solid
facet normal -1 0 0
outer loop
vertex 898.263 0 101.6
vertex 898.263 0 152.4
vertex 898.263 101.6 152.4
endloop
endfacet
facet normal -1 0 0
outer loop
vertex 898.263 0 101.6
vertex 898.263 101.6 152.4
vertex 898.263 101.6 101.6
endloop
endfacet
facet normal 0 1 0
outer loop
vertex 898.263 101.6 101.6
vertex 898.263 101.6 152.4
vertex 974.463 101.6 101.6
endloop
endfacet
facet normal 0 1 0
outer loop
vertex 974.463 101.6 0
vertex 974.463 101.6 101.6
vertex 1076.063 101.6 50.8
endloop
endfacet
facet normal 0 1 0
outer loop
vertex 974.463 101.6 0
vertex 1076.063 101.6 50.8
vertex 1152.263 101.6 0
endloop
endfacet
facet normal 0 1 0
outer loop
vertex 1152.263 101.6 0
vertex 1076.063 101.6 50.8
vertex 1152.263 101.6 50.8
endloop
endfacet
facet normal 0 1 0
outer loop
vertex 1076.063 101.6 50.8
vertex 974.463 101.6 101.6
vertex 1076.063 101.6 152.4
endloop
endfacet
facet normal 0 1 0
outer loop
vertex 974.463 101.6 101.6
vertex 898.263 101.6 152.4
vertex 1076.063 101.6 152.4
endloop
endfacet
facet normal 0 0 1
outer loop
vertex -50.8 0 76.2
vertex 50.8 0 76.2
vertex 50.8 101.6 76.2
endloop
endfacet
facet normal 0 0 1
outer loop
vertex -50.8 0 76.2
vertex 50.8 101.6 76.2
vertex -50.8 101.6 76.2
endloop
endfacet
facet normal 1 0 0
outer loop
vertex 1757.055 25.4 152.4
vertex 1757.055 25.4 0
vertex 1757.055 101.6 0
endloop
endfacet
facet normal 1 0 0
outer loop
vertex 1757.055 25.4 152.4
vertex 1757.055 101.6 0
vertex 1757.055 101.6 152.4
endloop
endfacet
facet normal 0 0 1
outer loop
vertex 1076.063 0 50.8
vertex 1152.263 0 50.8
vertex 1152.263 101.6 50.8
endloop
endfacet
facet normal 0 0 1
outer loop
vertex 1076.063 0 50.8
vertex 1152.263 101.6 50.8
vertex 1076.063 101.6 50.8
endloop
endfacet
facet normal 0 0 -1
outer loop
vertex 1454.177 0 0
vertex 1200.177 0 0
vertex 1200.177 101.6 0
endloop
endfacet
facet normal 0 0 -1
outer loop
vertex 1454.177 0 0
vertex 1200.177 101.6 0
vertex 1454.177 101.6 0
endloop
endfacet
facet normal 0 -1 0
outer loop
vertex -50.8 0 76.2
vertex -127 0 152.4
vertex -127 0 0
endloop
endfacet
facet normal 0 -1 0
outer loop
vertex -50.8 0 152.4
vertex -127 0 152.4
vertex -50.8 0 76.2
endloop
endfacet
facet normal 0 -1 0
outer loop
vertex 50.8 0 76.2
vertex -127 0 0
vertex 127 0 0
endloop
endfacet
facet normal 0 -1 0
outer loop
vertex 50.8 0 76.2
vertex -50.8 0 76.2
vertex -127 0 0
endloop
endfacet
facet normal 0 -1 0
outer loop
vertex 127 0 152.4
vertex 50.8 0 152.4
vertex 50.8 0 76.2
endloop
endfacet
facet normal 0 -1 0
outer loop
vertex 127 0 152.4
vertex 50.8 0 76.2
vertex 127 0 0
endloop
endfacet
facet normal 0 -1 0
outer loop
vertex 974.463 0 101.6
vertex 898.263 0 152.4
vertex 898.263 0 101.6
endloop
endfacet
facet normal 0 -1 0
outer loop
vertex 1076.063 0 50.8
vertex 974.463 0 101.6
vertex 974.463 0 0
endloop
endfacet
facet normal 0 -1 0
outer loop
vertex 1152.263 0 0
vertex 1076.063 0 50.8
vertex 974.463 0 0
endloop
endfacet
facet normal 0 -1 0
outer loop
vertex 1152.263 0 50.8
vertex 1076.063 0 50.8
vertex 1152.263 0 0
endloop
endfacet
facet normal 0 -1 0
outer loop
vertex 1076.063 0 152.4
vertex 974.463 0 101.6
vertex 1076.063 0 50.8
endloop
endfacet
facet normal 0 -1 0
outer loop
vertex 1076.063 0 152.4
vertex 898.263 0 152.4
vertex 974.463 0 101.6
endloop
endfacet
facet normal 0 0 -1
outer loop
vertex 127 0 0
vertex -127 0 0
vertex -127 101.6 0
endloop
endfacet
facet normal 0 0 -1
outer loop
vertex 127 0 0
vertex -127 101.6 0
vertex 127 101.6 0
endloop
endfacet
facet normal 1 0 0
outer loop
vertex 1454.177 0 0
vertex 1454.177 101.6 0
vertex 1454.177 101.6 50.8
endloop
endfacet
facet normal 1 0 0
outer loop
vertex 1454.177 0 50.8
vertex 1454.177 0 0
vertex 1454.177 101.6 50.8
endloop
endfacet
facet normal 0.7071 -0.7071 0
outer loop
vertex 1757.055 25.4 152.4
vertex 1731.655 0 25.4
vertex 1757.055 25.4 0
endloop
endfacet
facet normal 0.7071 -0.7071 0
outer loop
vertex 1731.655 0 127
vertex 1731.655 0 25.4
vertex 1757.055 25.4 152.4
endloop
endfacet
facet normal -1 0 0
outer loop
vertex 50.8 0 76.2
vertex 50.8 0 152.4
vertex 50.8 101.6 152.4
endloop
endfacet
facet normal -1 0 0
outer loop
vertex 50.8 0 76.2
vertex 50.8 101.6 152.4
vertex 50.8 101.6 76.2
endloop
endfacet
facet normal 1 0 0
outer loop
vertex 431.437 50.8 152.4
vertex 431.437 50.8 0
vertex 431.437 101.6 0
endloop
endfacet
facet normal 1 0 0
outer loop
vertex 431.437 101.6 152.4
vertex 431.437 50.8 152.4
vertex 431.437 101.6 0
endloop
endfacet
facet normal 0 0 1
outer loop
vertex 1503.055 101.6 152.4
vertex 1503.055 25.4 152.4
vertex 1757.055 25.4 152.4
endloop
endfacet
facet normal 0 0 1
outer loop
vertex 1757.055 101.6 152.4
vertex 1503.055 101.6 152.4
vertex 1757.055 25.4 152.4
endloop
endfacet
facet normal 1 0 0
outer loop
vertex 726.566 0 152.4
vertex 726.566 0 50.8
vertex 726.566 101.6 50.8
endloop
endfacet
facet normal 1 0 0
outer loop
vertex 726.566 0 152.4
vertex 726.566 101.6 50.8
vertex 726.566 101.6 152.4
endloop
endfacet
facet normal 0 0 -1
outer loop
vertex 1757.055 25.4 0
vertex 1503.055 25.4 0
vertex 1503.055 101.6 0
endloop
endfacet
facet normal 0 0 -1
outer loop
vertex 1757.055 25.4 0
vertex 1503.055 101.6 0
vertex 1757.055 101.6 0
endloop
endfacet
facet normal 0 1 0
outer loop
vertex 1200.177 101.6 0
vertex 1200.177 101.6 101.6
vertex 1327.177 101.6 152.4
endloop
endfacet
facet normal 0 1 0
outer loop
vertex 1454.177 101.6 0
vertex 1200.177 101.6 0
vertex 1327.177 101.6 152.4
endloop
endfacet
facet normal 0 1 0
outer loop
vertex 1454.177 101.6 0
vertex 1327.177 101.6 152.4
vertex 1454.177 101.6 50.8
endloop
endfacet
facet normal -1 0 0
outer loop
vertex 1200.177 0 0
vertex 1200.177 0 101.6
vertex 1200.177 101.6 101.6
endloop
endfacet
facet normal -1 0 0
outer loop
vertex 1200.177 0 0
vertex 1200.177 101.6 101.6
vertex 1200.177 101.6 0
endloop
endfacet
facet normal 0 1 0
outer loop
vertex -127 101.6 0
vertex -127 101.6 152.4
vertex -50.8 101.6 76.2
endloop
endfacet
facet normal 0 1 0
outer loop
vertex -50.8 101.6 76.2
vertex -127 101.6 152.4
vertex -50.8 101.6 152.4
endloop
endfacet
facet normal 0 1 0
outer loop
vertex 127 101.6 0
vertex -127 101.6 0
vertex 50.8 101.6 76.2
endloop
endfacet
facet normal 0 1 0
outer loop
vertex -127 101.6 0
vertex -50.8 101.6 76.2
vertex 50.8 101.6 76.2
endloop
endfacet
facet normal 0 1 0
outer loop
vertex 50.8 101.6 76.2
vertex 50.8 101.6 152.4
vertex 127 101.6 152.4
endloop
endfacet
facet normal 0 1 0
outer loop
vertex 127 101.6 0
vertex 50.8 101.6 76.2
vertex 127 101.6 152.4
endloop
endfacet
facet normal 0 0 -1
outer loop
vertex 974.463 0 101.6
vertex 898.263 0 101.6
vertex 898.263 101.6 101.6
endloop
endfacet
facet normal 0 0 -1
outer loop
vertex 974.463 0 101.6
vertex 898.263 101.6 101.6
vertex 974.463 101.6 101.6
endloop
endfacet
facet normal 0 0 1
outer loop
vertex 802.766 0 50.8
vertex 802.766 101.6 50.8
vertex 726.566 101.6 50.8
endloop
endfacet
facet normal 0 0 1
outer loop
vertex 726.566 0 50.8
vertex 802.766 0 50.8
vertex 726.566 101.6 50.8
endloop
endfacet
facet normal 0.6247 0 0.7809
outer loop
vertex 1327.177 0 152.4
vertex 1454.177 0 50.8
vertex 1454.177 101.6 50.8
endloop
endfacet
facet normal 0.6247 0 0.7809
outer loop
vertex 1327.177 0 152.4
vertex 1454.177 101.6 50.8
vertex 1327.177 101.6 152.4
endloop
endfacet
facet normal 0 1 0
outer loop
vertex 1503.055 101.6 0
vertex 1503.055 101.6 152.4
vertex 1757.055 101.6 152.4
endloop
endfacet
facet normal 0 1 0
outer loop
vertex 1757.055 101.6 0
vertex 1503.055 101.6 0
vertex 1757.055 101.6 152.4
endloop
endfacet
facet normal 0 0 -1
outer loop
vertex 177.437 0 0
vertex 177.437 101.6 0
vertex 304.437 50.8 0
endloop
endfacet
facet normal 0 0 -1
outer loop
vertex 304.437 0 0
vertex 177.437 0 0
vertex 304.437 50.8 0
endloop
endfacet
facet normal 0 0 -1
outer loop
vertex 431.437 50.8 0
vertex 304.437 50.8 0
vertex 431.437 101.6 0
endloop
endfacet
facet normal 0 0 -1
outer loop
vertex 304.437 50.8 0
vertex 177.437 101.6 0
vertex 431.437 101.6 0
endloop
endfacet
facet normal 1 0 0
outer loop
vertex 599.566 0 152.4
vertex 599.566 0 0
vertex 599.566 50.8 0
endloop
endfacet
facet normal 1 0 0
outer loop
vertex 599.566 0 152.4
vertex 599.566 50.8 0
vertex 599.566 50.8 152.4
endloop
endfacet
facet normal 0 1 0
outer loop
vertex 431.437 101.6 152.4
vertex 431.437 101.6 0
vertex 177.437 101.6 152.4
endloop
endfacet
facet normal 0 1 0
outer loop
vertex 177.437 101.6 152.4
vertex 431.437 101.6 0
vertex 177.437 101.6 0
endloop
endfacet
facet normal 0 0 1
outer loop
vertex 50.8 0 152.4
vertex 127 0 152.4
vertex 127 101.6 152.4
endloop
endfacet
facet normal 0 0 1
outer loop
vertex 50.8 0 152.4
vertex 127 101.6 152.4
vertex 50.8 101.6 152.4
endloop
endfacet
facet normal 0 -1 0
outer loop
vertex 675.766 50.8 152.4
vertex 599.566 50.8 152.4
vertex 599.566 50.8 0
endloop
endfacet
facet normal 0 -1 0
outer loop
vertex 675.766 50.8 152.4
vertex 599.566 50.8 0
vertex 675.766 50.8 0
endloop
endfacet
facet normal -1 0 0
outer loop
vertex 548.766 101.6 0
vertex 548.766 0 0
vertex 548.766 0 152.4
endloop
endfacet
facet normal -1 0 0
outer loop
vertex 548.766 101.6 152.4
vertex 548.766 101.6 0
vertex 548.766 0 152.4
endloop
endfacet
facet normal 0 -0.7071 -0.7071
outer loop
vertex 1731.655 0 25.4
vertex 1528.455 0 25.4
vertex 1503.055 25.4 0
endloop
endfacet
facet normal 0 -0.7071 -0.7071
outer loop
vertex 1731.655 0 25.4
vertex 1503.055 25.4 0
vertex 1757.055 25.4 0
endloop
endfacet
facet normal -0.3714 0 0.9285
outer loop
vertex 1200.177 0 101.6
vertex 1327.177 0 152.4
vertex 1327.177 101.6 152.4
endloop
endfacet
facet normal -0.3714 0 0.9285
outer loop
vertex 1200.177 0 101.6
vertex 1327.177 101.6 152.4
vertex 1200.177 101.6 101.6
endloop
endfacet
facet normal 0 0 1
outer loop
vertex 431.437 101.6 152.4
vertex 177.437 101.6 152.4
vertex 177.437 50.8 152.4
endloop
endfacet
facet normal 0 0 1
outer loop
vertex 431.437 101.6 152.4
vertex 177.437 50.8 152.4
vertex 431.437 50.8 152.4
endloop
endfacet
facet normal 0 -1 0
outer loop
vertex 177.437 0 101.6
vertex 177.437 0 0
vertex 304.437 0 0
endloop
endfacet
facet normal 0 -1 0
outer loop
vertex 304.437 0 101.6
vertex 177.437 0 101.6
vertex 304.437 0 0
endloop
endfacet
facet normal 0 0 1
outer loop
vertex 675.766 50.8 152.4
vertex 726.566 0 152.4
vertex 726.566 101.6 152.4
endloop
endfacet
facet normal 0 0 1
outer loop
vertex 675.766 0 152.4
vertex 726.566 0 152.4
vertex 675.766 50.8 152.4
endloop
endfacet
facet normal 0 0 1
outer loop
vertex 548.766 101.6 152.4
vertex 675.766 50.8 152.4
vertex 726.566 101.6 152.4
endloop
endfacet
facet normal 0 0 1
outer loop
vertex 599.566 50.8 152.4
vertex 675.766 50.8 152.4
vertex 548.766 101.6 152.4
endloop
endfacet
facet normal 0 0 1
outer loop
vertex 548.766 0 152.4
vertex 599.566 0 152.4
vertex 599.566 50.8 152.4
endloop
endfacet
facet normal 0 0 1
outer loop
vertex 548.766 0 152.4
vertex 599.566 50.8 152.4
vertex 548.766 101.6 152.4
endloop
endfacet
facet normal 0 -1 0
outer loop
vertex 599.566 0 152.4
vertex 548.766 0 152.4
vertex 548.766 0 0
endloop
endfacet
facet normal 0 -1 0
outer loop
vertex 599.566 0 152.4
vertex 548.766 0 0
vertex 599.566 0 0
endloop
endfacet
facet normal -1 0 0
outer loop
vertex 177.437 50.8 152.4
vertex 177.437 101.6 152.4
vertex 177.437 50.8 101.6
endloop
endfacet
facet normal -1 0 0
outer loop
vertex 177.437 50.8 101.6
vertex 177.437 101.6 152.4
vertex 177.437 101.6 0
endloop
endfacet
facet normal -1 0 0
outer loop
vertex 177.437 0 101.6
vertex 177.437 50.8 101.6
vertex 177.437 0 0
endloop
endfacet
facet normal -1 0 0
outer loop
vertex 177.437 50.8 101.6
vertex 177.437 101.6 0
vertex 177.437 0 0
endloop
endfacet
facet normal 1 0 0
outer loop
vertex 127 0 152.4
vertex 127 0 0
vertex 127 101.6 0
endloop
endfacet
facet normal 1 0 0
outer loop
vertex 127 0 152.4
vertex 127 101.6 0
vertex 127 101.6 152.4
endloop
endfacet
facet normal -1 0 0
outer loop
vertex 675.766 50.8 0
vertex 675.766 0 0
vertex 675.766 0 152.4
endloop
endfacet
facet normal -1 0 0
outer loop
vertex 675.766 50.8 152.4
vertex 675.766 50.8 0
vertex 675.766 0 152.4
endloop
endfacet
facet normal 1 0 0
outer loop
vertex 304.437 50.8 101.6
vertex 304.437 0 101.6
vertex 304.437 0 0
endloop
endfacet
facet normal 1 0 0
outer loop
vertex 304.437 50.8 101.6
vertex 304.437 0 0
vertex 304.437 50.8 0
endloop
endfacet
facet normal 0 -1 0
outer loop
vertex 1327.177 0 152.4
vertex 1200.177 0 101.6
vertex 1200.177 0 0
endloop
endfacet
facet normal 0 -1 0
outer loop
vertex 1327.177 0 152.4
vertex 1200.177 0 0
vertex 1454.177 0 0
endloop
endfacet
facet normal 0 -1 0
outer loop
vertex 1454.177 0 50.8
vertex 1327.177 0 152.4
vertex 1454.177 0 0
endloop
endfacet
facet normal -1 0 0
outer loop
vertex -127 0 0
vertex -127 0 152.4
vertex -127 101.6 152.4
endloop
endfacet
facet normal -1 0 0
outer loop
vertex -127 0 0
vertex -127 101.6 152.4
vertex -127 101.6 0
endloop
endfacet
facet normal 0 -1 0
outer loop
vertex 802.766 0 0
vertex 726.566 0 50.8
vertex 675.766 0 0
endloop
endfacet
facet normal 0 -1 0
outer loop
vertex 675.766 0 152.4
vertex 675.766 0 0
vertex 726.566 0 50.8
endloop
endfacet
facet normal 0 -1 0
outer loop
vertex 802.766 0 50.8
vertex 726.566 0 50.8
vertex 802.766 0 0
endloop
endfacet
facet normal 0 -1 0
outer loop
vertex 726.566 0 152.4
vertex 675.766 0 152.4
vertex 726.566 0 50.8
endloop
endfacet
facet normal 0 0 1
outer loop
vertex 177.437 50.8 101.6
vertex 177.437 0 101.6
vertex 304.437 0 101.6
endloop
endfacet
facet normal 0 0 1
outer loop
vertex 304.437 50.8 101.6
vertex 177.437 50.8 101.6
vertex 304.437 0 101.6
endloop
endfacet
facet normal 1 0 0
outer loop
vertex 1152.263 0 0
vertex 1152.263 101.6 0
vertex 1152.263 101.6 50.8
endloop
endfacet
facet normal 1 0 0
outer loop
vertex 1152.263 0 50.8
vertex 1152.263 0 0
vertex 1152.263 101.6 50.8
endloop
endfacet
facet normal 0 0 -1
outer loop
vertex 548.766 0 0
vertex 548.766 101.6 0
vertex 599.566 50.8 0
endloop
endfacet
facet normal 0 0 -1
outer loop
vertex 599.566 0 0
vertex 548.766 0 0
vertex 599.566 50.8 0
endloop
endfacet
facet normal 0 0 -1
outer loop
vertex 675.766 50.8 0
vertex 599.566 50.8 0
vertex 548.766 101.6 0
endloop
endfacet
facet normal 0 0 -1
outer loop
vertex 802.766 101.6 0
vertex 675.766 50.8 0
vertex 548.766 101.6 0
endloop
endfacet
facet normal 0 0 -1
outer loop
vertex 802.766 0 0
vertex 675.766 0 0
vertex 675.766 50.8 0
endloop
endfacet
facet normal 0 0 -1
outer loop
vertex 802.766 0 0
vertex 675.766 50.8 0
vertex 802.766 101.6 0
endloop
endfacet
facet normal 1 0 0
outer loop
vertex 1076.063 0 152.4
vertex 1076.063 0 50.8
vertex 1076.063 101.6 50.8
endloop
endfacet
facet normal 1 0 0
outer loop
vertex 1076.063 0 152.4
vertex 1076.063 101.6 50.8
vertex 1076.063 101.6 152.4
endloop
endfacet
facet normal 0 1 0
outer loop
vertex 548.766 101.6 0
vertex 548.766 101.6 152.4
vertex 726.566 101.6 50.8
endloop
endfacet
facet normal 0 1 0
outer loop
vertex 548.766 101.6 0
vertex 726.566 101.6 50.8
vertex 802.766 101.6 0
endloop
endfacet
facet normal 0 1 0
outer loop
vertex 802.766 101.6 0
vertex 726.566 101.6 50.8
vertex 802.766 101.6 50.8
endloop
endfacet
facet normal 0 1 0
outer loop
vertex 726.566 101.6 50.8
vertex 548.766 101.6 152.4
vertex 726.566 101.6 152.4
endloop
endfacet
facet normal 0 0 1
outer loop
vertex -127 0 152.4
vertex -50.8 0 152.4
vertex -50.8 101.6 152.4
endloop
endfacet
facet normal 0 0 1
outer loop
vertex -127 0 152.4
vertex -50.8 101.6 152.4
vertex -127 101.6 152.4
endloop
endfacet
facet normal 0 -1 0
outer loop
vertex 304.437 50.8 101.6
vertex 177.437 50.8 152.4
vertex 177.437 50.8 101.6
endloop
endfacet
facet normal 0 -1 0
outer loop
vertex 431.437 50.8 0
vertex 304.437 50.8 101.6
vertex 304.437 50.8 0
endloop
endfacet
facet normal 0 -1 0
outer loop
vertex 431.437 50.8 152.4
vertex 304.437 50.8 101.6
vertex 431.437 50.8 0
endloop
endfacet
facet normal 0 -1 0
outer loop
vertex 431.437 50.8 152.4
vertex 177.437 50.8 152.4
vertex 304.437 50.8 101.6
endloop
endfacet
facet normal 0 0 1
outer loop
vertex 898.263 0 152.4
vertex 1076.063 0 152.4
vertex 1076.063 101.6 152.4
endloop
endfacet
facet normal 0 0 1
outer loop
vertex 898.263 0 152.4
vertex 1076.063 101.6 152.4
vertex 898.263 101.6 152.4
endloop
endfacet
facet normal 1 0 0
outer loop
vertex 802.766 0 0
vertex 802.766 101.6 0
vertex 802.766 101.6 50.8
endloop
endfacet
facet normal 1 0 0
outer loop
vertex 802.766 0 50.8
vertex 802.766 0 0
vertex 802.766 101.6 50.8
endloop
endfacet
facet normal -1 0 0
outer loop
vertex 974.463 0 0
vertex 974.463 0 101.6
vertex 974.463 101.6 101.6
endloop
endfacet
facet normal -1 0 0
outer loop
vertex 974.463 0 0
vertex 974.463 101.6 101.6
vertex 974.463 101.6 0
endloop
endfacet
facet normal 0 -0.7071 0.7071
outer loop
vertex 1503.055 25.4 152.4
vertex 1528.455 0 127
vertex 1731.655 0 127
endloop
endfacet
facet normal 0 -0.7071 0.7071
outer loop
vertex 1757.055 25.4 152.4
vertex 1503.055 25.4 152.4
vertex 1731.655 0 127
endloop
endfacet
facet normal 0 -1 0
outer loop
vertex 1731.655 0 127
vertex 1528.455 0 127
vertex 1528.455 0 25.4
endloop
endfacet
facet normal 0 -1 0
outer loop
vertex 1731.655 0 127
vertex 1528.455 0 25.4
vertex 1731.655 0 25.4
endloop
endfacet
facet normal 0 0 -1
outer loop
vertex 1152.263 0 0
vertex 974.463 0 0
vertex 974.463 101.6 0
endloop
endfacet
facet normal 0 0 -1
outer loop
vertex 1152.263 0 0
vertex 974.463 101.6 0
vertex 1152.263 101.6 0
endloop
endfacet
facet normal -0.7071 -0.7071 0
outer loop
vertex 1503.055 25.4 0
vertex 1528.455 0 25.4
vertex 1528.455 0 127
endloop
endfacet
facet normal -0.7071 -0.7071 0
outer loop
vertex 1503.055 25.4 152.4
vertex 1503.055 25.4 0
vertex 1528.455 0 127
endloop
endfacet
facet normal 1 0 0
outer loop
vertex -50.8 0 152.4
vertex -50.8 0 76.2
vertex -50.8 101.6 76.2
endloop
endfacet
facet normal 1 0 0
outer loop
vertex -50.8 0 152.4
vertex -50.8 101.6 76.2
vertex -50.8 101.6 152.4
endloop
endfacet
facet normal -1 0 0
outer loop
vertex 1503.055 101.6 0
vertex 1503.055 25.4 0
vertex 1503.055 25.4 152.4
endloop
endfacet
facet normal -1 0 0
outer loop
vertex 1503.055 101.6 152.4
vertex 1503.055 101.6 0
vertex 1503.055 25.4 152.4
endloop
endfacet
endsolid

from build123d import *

# Parameters (mm, degrees)
F1_DEPTH  = 101.6
F3_DEPTH  = 152.4
F4_W      = 127
F4_H      = 50.8
F5_DEPTH  = 50.8
F6_W      = 50.8
F6_H      = 152.4
F7_DEPTH  = 101.6
F8_W      = 76.2
F8_H      = 152.4
F9_DEPTH  = 50.8
F11_DEPTH = 101.6
F13_DEPTH = 101.6
F14_W     = 254
F14_H     = 152.4
F15_DEPTH = 101.6
F16_SIZE  = 25.4


with BuildPart() as f1:
    # F0 (on Front) → F1 (new body)
    with BuildSketch(Plane.XZ):
        Polygon((-127, 0), (0, 0), (127, 0), (127, 152.4), (50.8, 152.4), (50.8, 76.2), (-50.8, 76.2), (-50.8, 152.4), (-127, 152.4), align=None)
    extrude(amount=-F1_DEPTH)


with BuildPart() as f3:
    # F2 (on Top) → F3 (new body)
    with BuildSketch(Plane.XY):
        Polygon((177.437432, 101.6), (177.437432, 0), (304.437432, 0), (304.437432, 50.8), (431.437432, 50.8), (431.437432, 101.6), align=None)
    extrude(amount=F3_DEPTH)

    # F4 (on face) → F5 (cut)
    with BuildSketch(Plane.XZ):
        with Locations((240.937432, 127)):
            Rectangle(F4_W, F4_H)
    extrude(amount=-F5_DEPTH, mode=Mode.SUBTRACT)


with BuildPart() as f7:
    # F6 (on Front) → F7 (new body)
    with BuildSketch(Plane.XZ):
        with Locations((574.165634, 76.2)):
            Rectangle(F6_W, F6_H)
        Polygon((599.565634, 152.4), (599.565634, 0), (802.765634, 0), (802.765634, 50.8), (726.565634, 50.8), (726.565634, 152.4), align=None)
    extrude(amount=-F7_DEPTH)

    # F8 (on face) → F9 (cut)
    with BuildSketch(Plane.XZ):
        with Locations((637.665634, 76.2)):
            Rectangle(F8_W, F8_H)
    extrude(amount=-F9_DEPTH, mode=Mode.SUBTRACT)


with BuildPart() as f11:
    # F10 (on Front) → F11 (new body)
    with BuildSketch(Plane.XZ):
        Polygon((1076.062926, 152.4), (898.262926, 152.4), (898.262926, 101.6), (974.462926, 101.6), (974.462926, 0), (1152.262926, 0), (1152.262926, 50.8), (1076.062926, 50.8), align=None)
    extrude(amount=-F11_DEPTH)


with BuildPart() as f13:
    # F12 (on Front) → F13 (new body)
    with BuildSketch(Plane.XZ):
        Polygon((1200.177227, 101.6), (1200.177227, 0), (1454.177227, 0), (1454.177227, 50.8), (1327.177227, 152.4), align=None)
    extrude(amount=-F13_DEPTH)


with BuildPart() as f15:
    # F14 (on Front) → F15 (new body)
    with BuildSketch(Plane.XZ):
        with Locations((1630.055249, 76.2)):
            Rectangle(F14_W, F14_H)
    extrude(amount=-F15_DEPTH)

    # F16
    f16_edges = [f15.edges().sort_by_distance(p)[0] for p in [
        (1630.055249, 0, 152.4),
        (1757.055249, 0, 76.2),
        (1630.055249, 0, 0),
        (1503.055249, 0, 76.2),
    ]]
    chamfer(f16_edges, length=F16_SIZE)


solid = Compound([f1.part, f3.part, f7.part, f11.part, f13.part, f15.part])
